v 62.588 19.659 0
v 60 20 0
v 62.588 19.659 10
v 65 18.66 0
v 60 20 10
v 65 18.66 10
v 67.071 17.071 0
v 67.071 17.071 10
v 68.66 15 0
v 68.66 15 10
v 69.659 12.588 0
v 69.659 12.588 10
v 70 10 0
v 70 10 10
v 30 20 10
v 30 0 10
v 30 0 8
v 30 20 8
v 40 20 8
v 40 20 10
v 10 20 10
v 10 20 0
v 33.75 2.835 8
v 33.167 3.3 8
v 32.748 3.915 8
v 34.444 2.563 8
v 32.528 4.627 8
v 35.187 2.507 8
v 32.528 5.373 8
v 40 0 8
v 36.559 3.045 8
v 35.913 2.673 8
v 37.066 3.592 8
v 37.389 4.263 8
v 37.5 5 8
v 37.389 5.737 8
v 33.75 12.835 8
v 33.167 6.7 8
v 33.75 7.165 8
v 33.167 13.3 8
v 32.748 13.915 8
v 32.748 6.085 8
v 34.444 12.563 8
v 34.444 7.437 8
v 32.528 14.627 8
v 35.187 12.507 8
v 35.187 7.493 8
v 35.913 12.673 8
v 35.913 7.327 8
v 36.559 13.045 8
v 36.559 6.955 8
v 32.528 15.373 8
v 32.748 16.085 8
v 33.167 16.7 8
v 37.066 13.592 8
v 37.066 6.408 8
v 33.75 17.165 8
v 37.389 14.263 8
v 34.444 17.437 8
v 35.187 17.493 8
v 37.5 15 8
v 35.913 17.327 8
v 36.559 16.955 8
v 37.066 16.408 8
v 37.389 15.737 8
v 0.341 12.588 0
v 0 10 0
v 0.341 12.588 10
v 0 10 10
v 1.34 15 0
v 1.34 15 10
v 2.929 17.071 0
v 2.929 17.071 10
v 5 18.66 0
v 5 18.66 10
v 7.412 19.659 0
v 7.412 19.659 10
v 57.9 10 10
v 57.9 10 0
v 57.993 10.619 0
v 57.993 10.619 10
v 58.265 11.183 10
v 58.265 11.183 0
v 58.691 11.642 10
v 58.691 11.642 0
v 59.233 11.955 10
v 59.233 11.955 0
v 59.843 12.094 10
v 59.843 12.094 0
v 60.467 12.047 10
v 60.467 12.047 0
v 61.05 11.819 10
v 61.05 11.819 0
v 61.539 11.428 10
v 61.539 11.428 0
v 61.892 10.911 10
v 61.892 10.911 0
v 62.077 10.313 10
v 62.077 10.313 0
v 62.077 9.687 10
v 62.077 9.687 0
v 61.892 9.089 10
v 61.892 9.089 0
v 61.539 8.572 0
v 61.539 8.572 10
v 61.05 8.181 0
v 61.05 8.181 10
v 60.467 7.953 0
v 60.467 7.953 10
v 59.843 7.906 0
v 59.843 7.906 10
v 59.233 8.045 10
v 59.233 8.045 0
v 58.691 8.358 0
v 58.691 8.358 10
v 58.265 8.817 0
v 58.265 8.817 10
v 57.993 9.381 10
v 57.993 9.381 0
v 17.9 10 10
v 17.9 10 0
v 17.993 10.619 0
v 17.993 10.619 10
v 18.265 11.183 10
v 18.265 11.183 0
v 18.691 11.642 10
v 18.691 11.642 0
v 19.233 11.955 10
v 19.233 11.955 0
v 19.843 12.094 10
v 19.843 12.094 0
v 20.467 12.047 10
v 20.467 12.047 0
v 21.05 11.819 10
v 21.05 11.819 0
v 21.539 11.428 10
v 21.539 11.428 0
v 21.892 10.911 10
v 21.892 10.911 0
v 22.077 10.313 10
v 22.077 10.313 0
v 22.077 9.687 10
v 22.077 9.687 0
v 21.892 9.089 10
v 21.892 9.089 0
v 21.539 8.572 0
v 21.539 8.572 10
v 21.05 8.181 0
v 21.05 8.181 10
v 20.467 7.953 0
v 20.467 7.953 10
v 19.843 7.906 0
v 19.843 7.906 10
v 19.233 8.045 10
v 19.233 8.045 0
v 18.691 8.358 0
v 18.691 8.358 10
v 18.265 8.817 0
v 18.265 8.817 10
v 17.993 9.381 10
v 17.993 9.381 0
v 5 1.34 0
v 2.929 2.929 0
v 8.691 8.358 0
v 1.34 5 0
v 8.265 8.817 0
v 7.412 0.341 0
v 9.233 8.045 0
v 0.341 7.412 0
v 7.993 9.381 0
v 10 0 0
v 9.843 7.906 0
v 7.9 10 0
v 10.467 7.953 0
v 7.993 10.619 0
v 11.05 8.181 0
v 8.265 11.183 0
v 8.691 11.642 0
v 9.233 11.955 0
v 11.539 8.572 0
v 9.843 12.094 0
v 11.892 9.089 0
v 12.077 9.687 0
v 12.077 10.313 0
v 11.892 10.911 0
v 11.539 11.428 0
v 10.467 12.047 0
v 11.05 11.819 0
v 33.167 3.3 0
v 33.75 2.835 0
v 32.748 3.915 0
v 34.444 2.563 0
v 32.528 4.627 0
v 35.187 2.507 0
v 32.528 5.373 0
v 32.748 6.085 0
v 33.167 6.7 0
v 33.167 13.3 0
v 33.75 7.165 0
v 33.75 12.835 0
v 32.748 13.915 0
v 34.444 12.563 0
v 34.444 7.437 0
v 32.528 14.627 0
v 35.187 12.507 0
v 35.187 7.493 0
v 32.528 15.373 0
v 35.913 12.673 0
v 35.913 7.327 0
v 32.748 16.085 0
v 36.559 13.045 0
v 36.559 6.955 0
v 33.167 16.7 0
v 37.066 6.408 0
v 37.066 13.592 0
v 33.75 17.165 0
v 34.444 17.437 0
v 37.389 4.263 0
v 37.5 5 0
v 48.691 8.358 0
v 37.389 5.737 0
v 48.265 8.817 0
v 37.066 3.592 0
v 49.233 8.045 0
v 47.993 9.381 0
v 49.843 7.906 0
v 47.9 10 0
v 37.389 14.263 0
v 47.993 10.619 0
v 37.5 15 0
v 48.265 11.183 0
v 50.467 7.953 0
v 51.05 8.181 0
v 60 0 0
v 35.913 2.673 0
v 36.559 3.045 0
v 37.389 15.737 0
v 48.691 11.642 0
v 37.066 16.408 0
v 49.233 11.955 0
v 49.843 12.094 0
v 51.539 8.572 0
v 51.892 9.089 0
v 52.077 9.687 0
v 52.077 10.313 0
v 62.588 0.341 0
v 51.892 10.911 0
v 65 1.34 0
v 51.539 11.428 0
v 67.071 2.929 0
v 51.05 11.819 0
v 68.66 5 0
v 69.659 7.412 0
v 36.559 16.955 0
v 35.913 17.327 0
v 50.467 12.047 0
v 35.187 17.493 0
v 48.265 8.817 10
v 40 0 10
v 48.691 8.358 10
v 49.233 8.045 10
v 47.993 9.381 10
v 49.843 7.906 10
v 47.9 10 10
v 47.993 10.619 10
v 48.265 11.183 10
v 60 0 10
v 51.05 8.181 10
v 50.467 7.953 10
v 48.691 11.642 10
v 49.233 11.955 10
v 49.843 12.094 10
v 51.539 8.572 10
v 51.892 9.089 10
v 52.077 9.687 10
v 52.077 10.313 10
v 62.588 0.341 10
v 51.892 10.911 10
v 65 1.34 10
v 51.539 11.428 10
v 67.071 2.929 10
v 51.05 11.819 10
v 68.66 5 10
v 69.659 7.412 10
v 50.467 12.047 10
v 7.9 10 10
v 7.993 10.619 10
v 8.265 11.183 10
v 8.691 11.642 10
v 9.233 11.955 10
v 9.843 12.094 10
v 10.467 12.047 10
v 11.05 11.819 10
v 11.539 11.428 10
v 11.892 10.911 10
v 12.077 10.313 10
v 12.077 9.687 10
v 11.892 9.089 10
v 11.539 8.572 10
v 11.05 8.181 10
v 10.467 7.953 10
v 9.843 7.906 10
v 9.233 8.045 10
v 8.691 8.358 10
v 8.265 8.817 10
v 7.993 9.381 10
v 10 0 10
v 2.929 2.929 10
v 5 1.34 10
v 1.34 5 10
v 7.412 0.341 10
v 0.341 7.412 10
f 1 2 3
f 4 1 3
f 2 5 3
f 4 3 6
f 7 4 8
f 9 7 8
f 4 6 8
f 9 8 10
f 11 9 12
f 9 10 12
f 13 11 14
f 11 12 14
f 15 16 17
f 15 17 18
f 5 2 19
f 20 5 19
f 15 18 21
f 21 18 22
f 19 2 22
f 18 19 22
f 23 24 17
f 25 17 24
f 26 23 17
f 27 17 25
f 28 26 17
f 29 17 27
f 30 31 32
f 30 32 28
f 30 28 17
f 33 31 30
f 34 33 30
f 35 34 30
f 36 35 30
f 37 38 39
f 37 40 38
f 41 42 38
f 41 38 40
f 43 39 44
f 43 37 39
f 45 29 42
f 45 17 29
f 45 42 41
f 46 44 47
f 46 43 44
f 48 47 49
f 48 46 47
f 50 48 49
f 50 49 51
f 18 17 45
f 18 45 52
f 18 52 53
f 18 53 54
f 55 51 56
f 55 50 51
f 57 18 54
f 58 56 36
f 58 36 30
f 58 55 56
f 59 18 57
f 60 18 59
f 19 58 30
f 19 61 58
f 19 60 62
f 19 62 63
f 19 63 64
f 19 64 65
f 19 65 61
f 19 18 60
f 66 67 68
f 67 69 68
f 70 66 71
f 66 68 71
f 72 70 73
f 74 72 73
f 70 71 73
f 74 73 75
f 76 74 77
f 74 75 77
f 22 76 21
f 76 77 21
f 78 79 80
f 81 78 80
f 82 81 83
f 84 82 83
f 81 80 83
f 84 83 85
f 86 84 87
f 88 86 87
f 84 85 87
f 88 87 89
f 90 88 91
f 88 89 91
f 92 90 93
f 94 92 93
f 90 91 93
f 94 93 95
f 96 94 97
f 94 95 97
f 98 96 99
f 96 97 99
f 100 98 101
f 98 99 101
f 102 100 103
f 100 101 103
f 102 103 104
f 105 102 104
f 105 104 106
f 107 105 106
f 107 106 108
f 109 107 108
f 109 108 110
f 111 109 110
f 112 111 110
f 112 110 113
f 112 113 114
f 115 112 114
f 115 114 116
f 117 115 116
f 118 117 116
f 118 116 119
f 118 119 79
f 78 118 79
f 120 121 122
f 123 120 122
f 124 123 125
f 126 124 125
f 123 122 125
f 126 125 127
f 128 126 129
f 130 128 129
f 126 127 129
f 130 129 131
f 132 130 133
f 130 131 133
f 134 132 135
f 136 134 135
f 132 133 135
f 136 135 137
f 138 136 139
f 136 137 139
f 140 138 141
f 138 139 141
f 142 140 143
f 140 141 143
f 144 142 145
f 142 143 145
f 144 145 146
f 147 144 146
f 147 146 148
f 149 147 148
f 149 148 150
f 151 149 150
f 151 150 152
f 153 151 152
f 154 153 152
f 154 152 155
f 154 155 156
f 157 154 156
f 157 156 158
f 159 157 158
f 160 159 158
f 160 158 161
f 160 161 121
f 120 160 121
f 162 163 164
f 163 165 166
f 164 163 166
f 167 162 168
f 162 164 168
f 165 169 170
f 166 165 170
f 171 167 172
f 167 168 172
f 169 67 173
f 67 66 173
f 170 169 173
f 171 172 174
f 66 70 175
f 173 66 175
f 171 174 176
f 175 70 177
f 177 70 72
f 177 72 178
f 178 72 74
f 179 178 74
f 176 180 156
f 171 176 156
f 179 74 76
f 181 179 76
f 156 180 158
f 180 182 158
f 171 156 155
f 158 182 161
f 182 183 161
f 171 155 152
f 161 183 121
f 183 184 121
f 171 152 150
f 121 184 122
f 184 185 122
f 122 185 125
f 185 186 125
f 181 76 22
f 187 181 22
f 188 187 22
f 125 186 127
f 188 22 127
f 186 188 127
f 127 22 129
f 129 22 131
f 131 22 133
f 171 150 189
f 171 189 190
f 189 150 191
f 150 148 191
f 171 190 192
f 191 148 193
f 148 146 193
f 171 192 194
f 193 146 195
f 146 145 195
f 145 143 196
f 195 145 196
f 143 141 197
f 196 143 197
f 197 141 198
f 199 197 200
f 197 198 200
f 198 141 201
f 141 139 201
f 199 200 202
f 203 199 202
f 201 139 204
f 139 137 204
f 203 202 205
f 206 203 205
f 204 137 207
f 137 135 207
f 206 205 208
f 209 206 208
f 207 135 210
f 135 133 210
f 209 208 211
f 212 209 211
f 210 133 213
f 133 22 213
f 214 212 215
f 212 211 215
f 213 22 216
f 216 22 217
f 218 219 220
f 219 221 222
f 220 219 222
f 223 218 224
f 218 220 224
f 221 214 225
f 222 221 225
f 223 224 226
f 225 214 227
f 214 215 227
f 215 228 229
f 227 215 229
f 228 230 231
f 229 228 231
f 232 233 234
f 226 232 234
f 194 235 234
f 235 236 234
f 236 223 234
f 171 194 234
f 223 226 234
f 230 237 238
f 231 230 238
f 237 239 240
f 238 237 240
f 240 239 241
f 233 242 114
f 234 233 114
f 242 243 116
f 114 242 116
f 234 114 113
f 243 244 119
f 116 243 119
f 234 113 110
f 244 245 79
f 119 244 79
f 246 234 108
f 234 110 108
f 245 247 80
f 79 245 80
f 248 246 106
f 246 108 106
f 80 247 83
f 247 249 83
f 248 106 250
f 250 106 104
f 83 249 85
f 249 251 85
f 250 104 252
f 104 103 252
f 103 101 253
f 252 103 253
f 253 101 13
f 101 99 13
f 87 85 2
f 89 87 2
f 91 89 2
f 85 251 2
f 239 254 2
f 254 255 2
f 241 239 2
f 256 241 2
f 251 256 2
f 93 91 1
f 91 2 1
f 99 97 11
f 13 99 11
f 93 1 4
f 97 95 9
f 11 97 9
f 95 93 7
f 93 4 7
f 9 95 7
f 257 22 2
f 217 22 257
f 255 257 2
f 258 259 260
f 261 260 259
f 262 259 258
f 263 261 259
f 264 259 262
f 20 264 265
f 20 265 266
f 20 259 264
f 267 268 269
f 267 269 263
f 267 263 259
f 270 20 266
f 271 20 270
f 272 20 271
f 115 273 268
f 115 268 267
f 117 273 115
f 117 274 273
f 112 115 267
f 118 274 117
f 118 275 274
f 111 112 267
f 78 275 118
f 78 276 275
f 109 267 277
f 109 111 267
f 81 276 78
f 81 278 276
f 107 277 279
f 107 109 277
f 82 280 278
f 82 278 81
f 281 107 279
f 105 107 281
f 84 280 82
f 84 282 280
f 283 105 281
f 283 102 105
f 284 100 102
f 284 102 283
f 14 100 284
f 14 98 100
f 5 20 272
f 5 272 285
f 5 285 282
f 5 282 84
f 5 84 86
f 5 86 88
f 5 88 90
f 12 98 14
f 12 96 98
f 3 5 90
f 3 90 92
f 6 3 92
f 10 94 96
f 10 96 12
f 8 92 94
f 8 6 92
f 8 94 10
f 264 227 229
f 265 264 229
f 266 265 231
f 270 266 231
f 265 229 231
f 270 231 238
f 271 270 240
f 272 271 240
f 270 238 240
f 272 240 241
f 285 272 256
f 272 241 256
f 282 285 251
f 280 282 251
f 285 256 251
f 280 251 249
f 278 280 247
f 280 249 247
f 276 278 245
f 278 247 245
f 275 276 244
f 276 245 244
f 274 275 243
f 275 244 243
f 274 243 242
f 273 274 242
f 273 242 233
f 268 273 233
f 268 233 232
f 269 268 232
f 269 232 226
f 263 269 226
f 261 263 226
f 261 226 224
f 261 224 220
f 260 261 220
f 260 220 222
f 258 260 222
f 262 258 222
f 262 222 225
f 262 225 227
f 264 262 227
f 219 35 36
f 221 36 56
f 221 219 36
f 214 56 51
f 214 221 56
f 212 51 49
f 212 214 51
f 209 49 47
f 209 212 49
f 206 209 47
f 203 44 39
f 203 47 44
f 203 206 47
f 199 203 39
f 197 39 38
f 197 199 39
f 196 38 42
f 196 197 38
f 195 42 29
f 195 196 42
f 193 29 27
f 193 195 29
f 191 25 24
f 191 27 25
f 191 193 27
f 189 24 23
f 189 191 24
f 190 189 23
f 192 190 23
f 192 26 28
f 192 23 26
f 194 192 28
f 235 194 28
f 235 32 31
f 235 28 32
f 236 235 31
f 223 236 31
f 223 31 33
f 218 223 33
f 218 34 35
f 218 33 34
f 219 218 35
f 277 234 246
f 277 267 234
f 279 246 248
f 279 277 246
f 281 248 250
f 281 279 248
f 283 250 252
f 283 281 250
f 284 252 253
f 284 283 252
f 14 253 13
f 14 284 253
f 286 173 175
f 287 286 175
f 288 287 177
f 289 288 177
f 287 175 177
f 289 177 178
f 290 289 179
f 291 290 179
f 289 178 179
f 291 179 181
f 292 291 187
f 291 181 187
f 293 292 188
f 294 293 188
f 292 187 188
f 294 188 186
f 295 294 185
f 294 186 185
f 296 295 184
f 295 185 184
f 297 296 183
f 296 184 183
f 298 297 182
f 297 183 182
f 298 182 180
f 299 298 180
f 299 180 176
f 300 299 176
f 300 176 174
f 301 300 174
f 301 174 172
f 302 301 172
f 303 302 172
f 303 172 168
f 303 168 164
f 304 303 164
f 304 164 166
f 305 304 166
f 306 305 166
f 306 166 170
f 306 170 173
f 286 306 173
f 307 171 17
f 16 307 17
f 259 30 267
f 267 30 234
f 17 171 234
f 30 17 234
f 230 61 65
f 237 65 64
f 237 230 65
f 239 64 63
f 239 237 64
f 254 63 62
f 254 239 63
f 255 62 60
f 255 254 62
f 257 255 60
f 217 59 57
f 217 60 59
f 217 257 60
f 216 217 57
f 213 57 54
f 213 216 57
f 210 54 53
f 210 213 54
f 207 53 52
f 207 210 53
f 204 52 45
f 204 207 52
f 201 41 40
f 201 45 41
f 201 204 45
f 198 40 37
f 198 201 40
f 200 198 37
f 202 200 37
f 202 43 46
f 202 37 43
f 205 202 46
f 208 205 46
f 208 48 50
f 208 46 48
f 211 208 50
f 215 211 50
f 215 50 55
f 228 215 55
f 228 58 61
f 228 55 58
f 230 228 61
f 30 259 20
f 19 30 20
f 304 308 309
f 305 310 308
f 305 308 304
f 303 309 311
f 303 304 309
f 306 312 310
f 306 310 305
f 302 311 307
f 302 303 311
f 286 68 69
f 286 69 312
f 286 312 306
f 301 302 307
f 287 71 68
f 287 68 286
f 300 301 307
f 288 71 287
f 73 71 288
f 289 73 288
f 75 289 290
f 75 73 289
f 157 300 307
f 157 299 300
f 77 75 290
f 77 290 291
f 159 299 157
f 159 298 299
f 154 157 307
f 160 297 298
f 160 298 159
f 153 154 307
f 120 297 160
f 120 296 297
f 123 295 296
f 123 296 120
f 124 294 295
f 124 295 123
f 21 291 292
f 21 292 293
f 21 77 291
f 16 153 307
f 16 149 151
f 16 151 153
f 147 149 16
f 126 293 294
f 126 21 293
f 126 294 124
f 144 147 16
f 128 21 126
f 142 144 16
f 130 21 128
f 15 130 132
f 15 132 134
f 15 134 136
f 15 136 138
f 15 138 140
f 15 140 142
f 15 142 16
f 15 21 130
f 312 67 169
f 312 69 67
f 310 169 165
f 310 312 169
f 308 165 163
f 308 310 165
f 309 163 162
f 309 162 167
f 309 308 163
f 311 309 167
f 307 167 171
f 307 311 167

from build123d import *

# Parameters (mm, degrees)
ESQUISSE1_R             = 2.5
BOSS_EXTRU_1_DEPTH      = 10
CONG_1_R                = 10
TROU_TARAUD_M5X0_81_D   = 4.2
ESQUISSE5_W             = 10
ESQUISSE5_H             = 20
ENL_V_MAT_EXTRU_1_DEPTH = 2


with BuildPart() as part:
    # Esquisse1 → Boss.-Extru.1 (new body)
    with BuildSketch(Plane.XY):
        Polygon((50, 20), (0, 20), (0, 0), (50, 0), (60, 0), (70, 0), (70, 20), (60, 20), align=None)
        with Locations((35, 5)):
            Circle(ESQUISSE1_R, mode=Mode.SUBTRACT)
        with Locations((35, 15)):
            Circle(ESQUISSE1_R, mode=Mode.SUBTRACT)
    extrude(amount=BOSS_EXTRU_1_DEPTH)

    # Congé1
    cong_1_edges = [part.edges().sort_by_distance(p)[0] for p in [
        (0, 0, 5),
        (0, 20, 5),
        (70, 0, 5),
        (70, 20, 5),
    ]]
    fillet(cong_1_edges, radius=CONG_1_R - 0.0001)  # a hair under: the kernel refuses the full size

    # Trou taraudé M5x0.81 (through all)
    with Locations(Plane.XY.offset(10)):
        with Locations((50, 10), (60, 10), (10, 10), (20, 10)):
            Hole(TROU_TARAUD_M5X0_81_D / 2)

    # Esquisse5 → Enlèv. mat.-Extru.1 (cut)
    with BuildSketch(Plane.XY.offset(10)):
        with Locations((35, 10)):
            Rectangle(ESQUISSE5_W, ESQUISSE5_H)
    extrude(amount=-ENL_V_MAT_EXTRU_1_DEPTH, mode=Mode.SUBTRACT)


solid = part.part
